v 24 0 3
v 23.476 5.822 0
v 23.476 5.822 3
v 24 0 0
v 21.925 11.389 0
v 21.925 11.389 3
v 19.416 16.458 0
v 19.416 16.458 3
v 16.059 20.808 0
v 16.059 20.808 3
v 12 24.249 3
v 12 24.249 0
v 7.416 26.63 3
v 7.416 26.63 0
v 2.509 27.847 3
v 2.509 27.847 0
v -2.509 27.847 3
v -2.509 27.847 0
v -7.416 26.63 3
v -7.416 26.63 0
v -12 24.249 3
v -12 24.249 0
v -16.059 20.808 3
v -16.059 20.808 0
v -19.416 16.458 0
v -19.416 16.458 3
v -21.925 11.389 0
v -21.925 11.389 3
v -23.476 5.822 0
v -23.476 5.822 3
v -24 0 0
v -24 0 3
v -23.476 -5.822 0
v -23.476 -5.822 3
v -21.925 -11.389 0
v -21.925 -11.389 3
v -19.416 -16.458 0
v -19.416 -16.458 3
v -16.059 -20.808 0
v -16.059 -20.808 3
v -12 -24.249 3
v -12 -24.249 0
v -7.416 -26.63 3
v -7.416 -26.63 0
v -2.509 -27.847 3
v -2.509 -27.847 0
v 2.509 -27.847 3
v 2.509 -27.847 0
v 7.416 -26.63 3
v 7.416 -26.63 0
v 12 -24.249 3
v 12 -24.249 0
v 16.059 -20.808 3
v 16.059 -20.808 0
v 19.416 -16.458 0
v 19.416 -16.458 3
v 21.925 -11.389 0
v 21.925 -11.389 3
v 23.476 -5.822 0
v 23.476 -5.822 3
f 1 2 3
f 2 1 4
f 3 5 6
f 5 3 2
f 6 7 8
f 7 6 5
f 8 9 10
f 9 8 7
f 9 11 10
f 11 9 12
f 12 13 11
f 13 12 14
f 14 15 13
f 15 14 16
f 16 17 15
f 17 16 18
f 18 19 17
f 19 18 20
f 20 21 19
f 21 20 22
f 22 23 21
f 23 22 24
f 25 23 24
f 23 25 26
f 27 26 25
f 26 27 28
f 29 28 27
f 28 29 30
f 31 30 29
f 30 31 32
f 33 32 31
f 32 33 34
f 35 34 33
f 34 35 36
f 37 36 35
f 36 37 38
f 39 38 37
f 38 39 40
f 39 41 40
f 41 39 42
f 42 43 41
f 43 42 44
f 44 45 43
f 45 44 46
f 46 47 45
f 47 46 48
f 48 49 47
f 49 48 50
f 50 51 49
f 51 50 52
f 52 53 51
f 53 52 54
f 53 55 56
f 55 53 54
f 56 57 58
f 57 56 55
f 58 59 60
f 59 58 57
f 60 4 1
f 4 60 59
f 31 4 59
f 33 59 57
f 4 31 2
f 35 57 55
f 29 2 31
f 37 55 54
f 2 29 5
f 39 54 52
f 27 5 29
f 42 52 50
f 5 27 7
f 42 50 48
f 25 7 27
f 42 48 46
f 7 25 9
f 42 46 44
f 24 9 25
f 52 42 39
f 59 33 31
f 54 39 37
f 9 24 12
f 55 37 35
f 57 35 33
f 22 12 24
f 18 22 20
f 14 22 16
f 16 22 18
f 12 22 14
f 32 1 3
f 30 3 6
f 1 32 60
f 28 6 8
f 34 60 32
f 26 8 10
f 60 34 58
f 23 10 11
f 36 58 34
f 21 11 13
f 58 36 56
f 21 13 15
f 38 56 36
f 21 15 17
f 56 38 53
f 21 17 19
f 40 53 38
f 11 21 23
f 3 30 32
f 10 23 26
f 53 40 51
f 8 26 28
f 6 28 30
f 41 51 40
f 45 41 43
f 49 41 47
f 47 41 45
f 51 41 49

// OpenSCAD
oval();

module oval(height = 3,
            xScale = 1.2,
            yScale = 1.4)
{
    scale (v=[xScale, yScale, 1]) 
    cylinder(h = height, r=20);
}
